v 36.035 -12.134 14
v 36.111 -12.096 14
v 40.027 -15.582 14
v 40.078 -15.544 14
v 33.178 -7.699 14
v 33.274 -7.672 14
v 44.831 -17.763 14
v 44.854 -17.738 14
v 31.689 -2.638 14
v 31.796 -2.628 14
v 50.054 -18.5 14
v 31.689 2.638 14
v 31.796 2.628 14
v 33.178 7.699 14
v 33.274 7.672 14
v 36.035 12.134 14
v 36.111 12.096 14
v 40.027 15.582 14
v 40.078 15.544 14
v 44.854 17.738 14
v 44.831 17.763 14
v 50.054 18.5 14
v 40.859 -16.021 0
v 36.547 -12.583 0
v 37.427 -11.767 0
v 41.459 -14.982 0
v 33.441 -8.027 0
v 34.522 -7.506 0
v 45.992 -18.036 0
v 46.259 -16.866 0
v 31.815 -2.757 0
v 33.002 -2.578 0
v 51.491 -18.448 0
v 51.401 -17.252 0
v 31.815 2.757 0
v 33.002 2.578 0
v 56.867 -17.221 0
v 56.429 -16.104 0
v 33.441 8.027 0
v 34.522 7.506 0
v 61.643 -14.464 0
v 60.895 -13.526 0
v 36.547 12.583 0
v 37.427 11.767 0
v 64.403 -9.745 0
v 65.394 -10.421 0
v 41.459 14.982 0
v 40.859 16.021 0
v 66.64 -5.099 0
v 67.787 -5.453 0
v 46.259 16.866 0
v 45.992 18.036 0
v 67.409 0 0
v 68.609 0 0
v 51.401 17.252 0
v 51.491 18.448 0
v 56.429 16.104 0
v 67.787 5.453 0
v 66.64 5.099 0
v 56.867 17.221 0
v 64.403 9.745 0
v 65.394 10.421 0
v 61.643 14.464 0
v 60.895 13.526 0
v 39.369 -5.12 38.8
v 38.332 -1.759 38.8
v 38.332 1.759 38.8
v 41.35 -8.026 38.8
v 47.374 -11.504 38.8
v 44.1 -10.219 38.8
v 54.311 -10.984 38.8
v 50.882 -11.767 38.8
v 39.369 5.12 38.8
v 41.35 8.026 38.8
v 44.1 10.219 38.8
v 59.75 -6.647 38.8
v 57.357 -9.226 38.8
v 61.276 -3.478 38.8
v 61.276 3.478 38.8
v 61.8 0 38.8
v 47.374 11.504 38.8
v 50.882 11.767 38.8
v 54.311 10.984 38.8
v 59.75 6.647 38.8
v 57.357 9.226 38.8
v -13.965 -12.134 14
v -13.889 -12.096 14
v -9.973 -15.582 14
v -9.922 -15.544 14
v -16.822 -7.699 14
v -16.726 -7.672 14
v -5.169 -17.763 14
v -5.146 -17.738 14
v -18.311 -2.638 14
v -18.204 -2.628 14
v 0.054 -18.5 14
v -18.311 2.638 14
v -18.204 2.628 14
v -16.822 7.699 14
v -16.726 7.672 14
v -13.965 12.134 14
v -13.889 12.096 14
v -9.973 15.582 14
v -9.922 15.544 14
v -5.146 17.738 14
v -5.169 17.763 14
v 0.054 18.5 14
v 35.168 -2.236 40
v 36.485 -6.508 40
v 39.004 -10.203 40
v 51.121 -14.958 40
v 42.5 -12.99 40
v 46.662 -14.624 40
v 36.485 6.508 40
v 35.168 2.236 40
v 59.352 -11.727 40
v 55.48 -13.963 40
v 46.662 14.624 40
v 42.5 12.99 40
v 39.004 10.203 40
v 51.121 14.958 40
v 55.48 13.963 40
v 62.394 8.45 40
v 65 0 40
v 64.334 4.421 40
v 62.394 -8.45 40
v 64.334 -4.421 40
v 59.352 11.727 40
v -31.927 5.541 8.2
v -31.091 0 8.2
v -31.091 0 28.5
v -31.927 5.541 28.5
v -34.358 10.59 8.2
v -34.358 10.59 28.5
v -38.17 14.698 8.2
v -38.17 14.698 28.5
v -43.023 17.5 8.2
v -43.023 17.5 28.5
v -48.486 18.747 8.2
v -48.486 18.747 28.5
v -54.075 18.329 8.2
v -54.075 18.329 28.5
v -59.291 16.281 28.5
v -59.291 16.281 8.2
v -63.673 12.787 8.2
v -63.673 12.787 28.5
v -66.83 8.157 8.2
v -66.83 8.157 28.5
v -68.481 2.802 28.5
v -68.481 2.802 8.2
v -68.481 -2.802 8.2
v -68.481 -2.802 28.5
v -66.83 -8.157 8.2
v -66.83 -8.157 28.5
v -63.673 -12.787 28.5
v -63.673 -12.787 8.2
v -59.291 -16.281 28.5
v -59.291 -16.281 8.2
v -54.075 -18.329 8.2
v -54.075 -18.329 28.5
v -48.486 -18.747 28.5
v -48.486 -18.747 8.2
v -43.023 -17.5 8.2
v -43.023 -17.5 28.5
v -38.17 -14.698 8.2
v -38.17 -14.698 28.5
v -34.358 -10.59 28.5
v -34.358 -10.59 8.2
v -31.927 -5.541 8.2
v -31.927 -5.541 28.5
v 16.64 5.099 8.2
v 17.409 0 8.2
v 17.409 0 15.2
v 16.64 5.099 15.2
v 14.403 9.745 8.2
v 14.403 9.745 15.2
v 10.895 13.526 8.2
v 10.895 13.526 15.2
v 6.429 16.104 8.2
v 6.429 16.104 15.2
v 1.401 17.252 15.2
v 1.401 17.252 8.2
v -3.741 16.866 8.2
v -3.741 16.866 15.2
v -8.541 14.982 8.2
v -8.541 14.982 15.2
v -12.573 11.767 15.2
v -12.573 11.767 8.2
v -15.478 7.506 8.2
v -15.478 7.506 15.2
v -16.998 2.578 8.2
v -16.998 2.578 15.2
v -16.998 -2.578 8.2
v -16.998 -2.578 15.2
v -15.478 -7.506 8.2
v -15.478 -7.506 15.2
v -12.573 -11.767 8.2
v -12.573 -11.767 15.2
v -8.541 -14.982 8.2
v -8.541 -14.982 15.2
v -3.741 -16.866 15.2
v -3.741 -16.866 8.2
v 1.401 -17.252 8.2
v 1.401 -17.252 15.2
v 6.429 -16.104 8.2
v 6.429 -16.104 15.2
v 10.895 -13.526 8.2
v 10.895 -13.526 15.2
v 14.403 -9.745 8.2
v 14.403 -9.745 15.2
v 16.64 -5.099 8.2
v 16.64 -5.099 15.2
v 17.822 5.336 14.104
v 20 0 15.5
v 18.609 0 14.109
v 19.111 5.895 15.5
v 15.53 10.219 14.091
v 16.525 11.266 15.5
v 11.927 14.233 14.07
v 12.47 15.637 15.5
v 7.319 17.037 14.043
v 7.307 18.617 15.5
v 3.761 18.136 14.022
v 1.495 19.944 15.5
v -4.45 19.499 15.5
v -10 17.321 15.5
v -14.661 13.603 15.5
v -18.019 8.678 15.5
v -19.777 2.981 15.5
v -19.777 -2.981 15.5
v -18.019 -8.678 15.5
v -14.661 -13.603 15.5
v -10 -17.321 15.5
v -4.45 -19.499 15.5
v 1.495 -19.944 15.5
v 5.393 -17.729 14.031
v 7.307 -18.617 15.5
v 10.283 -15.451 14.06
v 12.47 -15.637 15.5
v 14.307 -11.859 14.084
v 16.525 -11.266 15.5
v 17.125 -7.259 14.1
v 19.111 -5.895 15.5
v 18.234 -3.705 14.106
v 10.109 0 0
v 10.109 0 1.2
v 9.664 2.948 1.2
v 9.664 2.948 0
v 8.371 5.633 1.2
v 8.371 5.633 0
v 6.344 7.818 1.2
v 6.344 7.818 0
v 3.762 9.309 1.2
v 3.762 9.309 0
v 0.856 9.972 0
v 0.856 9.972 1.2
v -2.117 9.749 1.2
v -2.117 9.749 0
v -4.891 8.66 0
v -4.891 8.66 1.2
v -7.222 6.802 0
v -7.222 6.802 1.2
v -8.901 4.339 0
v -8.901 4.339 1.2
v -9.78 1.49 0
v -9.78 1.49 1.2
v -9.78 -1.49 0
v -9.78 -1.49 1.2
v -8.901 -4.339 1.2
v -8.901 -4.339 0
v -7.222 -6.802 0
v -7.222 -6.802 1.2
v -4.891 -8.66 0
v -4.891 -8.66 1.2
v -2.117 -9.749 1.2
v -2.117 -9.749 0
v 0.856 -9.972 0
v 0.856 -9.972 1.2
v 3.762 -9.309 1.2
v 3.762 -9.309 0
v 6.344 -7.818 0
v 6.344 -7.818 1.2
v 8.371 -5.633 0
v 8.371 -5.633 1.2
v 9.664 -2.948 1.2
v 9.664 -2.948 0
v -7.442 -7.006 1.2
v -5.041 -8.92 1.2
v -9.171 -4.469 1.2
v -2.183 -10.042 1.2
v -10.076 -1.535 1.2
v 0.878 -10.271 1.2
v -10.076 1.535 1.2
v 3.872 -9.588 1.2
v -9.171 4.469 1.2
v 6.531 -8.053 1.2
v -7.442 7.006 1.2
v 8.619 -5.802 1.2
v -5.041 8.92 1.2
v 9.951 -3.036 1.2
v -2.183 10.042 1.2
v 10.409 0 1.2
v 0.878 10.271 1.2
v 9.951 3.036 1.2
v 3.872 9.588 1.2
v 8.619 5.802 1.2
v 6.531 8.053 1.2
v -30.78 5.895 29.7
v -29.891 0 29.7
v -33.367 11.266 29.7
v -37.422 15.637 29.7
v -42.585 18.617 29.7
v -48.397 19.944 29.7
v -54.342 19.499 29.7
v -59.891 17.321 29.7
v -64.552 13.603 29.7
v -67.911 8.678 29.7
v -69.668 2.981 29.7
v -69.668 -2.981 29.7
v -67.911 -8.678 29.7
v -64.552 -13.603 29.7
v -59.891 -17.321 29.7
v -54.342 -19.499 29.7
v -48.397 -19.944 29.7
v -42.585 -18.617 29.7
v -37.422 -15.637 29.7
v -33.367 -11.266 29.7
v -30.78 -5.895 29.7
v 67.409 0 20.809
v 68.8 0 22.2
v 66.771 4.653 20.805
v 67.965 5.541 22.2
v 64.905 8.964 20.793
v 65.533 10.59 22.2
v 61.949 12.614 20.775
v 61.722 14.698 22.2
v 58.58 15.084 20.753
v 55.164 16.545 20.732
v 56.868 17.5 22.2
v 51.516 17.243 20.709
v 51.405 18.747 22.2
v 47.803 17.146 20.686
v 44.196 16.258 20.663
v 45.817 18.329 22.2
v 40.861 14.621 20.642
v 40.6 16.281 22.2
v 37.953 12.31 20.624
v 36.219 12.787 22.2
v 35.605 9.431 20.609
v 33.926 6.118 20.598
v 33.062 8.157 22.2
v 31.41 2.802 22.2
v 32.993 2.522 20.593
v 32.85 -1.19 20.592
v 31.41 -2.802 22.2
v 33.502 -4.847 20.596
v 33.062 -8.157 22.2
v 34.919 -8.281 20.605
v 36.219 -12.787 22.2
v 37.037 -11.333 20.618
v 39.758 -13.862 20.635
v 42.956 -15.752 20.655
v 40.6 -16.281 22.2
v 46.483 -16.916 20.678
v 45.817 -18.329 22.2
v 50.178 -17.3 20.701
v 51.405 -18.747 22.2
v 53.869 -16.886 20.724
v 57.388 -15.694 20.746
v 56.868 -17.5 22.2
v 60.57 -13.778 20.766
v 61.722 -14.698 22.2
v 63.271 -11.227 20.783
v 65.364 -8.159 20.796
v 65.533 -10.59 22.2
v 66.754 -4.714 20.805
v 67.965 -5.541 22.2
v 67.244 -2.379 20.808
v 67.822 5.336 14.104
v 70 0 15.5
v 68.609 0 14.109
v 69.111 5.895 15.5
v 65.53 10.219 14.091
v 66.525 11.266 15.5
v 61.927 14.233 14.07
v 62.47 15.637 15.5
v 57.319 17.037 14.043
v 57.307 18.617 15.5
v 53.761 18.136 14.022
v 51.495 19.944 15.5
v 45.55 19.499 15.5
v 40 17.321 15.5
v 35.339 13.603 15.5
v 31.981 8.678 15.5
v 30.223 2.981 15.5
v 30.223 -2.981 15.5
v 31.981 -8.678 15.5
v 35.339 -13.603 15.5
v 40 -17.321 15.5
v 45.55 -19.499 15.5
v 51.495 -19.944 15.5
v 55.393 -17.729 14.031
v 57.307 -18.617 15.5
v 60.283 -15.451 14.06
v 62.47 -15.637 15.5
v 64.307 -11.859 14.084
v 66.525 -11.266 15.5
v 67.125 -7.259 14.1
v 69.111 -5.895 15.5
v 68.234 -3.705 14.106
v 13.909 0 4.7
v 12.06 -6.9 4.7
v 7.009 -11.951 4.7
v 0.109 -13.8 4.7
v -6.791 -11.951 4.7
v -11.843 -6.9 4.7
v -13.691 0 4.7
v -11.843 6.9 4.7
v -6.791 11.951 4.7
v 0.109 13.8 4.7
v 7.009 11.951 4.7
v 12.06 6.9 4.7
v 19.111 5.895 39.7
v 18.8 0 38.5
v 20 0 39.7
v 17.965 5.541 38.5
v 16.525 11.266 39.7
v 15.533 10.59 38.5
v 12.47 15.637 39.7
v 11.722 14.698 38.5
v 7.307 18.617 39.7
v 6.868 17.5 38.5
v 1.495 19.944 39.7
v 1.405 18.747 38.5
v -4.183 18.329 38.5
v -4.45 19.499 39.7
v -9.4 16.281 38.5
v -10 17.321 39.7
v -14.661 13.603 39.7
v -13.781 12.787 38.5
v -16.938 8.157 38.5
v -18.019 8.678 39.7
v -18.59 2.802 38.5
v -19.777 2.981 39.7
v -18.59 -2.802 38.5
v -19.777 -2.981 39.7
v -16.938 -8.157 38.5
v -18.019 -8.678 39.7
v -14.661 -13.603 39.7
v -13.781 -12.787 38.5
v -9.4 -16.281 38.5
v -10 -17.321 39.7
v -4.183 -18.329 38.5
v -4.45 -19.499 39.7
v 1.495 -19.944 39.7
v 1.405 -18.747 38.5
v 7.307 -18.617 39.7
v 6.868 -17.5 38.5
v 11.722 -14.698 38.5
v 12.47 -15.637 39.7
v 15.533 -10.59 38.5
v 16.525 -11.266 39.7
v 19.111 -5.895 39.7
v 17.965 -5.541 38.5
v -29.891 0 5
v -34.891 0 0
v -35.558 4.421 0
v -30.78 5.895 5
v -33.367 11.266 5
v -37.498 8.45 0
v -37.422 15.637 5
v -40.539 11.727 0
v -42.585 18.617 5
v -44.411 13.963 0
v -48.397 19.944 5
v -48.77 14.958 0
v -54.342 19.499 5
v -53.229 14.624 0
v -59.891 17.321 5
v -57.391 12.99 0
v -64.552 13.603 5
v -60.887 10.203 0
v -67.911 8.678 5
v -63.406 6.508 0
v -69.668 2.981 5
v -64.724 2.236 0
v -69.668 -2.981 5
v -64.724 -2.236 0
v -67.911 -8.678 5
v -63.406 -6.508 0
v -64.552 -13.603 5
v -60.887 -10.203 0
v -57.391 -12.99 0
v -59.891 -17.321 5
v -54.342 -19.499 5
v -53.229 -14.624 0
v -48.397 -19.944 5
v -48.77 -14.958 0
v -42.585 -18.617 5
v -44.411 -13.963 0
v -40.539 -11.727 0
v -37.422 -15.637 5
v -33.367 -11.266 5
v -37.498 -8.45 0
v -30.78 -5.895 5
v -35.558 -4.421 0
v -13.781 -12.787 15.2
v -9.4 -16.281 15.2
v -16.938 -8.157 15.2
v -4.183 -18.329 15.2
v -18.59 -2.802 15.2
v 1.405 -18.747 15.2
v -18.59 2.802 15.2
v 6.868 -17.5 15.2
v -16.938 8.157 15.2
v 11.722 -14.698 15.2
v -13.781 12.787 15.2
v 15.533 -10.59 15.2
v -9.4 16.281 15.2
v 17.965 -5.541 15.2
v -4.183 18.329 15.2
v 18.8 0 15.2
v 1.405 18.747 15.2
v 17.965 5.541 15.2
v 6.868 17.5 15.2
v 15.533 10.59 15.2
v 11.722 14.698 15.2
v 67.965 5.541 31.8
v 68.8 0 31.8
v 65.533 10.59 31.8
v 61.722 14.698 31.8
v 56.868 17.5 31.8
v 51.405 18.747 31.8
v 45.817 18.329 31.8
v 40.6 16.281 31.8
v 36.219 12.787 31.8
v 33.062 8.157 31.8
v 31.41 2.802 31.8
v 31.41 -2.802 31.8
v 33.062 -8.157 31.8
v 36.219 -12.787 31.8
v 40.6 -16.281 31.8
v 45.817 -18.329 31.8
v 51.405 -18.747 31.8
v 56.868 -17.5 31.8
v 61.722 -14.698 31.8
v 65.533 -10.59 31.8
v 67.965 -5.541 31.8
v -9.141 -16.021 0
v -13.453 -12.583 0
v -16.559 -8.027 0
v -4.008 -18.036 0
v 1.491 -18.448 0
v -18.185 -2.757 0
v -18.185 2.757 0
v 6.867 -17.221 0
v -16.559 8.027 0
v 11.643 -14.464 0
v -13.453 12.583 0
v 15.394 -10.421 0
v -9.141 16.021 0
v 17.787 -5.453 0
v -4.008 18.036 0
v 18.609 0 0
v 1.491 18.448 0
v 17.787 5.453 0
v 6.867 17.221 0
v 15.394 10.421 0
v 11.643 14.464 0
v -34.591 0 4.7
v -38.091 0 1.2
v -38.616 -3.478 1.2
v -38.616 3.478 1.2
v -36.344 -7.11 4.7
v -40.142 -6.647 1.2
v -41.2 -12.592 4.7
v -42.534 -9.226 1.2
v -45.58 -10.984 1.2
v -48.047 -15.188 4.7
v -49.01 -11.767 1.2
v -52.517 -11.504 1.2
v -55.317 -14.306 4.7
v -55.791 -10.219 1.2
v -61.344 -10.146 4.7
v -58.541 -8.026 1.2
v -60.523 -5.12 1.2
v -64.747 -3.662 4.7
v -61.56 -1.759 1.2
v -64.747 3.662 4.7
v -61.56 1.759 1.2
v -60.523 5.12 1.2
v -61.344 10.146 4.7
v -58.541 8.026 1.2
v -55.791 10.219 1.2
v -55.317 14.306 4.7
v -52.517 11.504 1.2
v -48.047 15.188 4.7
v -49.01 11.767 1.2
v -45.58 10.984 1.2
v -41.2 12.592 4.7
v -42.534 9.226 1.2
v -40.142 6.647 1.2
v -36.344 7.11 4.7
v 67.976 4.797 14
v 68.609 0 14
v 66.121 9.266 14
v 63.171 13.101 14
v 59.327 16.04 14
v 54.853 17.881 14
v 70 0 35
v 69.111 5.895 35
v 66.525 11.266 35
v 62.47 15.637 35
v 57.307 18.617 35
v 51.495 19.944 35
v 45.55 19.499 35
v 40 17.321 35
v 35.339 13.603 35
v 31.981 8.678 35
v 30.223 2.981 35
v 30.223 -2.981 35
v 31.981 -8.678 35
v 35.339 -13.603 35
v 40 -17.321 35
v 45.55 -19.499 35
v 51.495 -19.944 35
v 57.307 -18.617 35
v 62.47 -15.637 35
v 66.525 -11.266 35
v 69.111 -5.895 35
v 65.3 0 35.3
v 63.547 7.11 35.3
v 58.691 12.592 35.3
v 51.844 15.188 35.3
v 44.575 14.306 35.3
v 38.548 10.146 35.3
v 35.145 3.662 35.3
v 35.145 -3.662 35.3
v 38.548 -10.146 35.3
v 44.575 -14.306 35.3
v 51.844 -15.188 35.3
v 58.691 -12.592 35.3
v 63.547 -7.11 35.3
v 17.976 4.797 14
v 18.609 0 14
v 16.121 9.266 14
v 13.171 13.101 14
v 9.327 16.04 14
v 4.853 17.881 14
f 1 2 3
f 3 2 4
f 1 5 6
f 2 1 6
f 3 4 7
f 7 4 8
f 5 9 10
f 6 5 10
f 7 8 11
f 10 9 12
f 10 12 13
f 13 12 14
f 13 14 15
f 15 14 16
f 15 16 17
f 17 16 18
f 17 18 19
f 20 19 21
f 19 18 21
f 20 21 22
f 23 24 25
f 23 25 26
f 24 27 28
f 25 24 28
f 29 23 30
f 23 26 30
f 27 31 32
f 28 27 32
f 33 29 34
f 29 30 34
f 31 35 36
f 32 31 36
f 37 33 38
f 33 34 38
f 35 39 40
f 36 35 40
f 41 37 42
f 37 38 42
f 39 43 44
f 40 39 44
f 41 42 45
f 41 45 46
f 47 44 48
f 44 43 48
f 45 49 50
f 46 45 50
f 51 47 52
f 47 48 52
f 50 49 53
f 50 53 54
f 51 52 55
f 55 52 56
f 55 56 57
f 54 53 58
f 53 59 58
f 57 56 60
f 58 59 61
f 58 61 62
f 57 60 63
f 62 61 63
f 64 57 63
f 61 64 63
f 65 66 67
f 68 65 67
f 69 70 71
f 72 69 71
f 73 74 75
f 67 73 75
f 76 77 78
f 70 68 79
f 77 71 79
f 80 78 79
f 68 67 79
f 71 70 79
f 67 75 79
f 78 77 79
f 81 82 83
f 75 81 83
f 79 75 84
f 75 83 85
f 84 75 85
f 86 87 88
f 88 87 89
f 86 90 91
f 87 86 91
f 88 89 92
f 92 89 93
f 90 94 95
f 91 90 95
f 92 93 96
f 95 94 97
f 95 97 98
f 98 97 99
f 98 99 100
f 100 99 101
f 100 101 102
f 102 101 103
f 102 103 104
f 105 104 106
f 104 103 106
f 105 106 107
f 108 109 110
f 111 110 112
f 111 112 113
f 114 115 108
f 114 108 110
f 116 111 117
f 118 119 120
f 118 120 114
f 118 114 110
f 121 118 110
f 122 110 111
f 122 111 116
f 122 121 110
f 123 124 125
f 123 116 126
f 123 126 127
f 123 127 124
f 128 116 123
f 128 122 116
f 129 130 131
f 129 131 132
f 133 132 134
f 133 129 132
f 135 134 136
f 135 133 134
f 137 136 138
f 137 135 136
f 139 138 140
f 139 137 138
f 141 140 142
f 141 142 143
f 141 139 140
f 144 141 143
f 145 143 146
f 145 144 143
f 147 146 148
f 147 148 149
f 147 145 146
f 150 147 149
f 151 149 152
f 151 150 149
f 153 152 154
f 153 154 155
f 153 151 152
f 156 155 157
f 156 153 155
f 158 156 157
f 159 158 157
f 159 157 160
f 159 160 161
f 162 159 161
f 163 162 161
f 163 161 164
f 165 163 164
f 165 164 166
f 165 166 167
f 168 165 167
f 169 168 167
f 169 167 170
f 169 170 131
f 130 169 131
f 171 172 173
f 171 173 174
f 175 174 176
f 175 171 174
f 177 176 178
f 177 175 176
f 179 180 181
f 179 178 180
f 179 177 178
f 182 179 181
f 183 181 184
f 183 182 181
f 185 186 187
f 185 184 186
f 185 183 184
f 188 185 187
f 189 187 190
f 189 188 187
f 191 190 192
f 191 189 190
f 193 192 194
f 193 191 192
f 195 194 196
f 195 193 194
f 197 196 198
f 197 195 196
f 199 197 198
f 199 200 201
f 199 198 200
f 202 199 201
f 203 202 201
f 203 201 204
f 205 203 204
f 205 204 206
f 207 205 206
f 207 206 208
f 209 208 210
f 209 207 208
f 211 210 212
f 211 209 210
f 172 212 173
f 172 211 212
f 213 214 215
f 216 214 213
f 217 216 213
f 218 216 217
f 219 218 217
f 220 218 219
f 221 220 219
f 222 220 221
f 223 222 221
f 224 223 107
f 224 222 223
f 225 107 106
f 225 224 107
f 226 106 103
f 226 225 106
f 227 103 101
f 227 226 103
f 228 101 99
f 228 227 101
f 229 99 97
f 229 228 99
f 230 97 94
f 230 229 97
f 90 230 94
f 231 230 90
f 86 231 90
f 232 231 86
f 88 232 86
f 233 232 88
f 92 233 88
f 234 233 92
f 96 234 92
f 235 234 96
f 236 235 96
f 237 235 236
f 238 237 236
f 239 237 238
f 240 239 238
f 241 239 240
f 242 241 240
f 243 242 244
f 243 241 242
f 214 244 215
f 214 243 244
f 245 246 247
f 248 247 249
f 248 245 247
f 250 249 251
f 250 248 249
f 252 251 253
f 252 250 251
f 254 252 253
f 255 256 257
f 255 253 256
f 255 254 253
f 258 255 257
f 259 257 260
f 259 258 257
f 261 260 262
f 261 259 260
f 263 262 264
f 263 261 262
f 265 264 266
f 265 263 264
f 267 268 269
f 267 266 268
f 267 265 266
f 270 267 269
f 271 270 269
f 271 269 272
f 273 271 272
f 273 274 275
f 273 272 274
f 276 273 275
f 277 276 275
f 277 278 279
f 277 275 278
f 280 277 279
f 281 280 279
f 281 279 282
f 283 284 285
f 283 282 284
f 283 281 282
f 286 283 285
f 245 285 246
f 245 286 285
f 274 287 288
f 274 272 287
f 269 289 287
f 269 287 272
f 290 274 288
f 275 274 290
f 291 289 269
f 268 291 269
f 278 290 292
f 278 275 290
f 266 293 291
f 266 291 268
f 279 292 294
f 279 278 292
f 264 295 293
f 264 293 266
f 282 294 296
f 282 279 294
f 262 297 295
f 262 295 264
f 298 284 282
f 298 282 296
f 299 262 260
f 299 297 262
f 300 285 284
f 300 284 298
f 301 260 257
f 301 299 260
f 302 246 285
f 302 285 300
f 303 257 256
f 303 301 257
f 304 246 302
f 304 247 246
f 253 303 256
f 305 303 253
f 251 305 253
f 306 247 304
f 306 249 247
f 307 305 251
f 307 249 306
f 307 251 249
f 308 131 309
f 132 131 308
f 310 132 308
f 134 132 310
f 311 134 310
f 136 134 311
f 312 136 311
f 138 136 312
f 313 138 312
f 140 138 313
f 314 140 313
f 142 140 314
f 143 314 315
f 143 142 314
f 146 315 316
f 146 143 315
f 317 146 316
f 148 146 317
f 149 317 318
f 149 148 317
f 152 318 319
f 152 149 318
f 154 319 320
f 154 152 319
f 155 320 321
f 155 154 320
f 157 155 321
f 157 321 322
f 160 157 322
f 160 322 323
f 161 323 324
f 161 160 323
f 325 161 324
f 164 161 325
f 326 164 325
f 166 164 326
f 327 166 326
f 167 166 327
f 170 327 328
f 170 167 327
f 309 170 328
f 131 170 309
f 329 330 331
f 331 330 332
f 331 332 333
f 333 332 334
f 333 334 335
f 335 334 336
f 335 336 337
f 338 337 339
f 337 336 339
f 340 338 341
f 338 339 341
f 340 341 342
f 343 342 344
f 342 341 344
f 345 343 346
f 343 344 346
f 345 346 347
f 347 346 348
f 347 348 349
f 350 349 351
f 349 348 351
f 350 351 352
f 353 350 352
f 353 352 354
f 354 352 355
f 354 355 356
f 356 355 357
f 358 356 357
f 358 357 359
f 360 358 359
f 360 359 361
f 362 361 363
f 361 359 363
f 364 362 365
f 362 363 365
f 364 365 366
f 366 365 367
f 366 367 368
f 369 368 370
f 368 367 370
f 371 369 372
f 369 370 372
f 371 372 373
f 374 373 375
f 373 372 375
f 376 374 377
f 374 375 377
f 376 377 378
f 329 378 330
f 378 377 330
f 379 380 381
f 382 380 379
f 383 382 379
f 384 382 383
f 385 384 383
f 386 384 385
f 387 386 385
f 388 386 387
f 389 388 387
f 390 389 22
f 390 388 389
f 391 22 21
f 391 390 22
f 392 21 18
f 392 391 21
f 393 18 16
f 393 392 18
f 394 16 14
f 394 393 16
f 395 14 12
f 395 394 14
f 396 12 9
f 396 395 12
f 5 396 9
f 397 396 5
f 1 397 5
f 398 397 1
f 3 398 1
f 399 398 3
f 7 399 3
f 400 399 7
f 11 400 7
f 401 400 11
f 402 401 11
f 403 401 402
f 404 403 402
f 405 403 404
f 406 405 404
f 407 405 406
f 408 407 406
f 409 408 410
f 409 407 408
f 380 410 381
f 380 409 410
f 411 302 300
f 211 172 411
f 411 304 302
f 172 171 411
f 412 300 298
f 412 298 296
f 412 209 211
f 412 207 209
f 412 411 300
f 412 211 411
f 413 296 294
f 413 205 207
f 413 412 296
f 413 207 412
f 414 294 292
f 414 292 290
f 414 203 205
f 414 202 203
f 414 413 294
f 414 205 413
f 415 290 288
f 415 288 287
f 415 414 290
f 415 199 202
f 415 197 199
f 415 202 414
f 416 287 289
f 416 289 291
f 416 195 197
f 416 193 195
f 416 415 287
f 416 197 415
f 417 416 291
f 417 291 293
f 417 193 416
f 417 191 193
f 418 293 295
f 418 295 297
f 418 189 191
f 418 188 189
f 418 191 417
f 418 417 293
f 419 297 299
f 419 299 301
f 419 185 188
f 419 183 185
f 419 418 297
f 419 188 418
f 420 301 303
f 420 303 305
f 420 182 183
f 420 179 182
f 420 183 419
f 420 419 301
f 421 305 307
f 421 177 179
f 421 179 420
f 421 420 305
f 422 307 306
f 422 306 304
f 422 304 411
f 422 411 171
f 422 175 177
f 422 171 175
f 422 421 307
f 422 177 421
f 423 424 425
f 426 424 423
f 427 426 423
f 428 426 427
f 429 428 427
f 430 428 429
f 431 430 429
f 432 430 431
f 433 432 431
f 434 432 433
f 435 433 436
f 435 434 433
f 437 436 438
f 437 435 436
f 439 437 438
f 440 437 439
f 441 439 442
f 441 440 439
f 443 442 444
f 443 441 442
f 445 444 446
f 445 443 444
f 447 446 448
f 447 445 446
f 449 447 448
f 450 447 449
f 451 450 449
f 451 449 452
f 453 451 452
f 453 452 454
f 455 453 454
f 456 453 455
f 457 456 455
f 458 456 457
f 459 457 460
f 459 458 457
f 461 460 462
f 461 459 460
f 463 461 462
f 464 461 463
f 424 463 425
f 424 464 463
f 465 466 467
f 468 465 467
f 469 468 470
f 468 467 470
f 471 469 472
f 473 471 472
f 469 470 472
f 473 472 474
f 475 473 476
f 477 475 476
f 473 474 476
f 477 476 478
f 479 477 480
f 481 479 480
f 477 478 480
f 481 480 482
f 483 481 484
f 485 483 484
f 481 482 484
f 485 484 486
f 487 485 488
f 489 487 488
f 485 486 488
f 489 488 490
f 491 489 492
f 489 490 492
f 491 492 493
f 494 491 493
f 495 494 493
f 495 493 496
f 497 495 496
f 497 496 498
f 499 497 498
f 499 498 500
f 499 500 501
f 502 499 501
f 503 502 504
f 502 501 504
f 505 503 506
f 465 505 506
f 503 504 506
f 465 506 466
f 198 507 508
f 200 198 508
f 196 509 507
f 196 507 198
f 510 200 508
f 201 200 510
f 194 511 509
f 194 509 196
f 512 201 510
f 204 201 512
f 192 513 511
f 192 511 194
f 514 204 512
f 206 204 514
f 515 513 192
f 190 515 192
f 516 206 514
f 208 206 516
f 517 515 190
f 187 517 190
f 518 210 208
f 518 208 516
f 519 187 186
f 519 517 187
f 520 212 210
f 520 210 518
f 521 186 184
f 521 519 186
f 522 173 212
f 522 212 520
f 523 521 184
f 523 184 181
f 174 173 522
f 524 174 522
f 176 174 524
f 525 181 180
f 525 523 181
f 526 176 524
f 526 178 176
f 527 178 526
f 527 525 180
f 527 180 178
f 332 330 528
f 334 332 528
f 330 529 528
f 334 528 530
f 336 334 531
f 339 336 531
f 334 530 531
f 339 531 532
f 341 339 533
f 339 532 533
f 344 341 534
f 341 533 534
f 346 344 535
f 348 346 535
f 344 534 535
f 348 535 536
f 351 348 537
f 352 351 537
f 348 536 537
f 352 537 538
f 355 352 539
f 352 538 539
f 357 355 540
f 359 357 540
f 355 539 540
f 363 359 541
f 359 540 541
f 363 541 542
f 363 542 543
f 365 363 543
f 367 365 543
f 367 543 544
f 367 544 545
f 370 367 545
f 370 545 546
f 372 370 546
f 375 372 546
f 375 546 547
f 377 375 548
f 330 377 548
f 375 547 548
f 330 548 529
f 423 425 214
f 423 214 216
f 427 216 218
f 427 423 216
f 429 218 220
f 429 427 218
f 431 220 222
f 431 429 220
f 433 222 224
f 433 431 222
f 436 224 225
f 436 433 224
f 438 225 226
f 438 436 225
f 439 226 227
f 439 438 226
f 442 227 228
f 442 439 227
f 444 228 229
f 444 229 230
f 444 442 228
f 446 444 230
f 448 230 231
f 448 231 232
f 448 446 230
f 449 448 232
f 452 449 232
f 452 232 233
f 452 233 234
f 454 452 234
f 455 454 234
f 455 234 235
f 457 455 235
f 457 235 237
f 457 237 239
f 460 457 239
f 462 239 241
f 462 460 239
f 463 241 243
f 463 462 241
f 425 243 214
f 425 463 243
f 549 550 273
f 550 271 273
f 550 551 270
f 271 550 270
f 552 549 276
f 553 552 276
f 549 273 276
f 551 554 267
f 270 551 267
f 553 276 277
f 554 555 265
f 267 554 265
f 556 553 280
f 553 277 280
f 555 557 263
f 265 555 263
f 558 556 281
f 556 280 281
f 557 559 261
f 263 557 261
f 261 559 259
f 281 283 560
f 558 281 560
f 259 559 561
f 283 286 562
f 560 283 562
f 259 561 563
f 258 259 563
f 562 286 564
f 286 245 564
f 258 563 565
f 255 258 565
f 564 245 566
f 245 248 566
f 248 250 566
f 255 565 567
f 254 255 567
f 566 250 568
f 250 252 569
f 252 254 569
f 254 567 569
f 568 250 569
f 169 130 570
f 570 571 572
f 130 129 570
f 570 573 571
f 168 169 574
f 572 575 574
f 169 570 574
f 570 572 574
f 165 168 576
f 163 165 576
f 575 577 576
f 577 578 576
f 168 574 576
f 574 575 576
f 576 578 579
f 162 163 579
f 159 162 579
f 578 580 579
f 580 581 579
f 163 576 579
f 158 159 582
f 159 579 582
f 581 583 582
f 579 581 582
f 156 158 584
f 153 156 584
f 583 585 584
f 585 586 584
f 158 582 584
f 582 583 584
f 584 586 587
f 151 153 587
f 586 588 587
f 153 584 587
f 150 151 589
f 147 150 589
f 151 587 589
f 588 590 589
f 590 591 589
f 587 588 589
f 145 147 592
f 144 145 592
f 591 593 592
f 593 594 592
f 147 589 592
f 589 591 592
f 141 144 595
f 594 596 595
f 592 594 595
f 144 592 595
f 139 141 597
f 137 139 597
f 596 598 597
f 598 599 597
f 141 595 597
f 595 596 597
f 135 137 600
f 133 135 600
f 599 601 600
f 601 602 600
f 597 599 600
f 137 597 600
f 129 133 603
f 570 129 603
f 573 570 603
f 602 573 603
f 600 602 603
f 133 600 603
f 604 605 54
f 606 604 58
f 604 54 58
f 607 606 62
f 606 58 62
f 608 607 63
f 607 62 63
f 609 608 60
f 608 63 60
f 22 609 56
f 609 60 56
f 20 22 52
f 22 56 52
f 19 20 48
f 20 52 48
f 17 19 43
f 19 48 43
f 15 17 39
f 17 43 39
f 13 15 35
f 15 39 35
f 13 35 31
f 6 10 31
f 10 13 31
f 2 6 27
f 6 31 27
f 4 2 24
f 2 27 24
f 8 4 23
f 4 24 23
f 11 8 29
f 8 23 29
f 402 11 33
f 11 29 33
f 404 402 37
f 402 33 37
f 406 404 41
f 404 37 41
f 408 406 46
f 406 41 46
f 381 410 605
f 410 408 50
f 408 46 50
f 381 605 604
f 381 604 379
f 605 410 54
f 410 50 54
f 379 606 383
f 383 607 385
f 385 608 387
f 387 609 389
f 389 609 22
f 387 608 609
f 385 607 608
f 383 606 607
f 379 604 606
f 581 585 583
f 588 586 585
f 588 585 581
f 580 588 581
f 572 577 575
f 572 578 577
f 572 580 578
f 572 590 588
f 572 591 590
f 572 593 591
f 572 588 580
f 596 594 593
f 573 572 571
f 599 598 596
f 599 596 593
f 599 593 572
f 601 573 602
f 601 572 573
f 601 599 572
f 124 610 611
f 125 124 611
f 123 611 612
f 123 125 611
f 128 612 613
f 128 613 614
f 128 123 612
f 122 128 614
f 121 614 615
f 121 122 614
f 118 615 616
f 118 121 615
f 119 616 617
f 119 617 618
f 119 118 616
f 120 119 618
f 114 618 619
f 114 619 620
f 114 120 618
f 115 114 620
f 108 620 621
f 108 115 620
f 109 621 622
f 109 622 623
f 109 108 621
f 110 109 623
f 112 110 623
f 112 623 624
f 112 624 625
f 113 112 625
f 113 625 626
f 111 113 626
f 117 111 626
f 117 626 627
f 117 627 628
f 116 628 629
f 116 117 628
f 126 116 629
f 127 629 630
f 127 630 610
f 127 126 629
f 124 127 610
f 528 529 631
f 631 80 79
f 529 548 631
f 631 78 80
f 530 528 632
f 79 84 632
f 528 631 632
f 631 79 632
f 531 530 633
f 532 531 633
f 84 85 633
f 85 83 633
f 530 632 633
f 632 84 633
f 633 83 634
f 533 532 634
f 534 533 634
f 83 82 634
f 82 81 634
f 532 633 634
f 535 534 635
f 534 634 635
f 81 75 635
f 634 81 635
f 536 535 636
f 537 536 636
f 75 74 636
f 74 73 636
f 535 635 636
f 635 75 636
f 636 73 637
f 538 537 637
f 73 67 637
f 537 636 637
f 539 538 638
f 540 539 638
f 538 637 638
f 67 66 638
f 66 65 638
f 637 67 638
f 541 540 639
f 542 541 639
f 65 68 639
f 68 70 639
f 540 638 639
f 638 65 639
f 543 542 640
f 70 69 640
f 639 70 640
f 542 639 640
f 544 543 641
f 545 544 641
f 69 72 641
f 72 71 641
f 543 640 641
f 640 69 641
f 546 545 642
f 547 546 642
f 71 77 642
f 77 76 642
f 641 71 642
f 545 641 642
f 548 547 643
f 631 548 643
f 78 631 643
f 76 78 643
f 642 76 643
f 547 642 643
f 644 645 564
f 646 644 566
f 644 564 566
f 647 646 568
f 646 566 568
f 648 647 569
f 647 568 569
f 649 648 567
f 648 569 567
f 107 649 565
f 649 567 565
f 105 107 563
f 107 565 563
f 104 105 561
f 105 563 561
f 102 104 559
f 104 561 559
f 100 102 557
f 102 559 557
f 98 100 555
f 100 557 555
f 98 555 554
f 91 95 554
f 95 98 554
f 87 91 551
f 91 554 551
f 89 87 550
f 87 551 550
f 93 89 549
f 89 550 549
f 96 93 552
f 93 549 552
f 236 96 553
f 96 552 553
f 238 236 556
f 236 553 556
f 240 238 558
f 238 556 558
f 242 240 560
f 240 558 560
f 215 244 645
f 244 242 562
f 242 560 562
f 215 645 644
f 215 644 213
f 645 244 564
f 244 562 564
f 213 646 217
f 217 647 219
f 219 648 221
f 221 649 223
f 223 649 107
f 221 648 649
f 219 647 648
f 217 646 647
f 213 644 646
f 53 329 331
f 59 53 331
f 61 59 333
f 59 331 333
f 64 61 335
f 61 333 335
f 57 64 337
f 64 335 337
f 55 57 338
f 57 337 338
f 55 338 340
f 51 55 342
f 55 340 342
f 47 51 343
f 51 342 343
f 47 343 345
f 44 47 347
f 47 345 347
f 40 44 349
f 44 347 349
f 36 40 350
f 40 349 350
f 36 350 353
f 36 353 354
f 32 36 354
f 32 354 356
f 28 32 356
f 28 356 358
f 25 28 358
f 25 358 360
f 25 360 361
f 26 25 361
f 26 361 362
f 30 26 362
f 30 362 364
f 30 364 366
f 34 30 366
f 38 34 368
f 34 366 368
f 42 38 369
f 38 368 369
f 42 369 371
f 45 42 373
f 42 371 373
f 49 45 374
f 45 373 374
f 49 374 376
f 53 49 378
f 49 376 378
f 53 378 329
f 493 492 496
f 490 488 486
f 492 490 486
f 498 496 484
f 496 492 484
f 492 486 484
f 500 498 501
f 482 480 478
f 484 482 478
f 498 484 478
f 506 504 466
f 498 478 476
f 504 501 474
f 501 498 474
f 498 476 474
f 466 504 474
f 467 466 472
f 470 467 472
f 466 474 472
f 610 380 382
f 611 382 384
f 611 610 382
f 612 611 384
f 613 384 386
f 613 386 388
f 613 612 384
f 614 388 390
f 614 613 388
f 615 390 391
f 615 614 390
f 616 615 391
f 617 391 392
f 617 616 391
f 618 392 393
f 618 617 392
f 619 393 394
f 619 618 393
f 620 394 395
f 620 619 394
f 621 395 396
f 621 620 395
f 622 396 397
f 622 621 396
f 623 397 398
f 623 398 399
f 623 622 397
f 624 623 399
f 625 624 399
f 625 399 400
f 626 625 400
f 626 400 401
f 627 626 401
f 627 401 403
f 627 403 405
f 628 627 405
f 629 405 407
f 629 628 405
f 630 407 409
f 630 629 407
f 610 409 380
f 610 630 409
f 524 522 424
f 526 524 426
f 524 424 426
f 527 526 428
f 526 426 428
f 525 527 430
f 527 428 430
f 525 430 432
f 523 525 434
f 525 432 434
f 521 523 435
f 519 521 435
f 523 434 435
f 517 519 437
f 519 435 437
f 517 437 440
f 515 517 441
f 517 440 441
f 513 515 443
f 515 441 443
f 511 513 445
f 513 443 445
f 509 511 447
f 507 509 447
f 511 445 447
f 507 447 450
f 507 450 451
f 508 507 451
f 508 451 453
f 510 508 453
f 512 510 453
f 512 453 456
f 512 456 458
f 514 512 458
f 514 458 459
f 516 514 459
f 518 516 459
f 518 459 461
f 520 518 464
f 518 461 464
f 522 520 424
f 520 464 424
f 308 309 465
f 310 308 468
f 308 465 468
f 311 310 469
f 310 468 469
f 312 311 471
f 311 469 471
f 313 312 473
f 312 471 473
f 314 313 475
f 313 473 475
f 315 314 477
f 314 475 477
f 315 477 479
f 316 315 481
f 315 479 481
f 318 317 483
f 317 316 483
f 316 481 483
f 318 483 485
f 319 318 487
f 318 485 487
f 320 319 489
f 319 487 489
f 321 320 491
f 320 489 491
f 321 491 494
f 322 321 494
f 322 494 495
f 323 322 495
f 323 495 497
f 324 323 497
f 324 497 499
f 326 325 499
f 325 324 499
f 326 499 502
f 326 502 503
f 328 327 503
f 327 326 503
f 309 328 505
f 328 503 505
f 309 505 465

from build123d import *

# Parameters (mm, degrees)
F0_R          = 20
F1_DEPTH      = 30
F0_R_2        = 18.5
F0_R_3        = 10
F2_DEPTH      = 15
F3_R          = 20
F4_DEPTH      = 25
F4_DEPTH_BACK = 1
F3_R_2        = 18.5
F5_T          = -1.2
F5_2_T        = -1.2
F5_3_T        = -1.2
F6_DEPTH      = 25.0000003725
F7_3_S7_R     = 17.3
F7_3_T8_DEPTH = 28
F8_2_S5_R     = 18.5
F8_2_T6_DEPTH = 30
F8_3_S5_R     = 18.5
F8_3_T6_DEPTH = 30
F9_SIZE       = 5
F9_2_SIZE     = 5


# Not quite as in the source:
# - a fillet or chamfer that OpenCascade refuses, or shapes differently, is made with other operations: its cross-section is extruded or revolved along the edge and cut away or added


with BuildPart() as f1:
    # F0 (on Top) → F1 (new body)
    with BuildSketch(Plane.XY):
        with Locations((-49.8913675547, 0)):
            Circle(F0_R)
    extrude(amount=F1_DEPTH)

    # F5
    f5_openings = [f1.faces().sort_by_distance(p)[0] for p in [
        (-49.891368, 0, 30),
    ]]
    offset(amount=F5_T, openings=f5_openings)

    # F7: chamfer of 7 on 1 edges, made by hand

    # F7_s1 → F7_t2 (revolve)
    with BuildSketch(Plane.XZ):
        Polygon((-31.0913675547, 8.2), (-38.0913675547, 1.2), (-31.0913675547, 1.2), align=None)
    revolve(axis=Axis((-49.8913675547, 0, 1.2), (0, 0, -1)))

    # F8: chamfer of 1.5 on 1 edges, made by hand

    # F8_s1 → F8_t2 (revolve, cut)
    with BuildSketch(Plane.XZ):
        Polygon((-29.5913675547, 30), (-31.0913675547, 28.5), (-31.0913675547, 30), align=None)
    revolve(axis=Axis((-49.8913675547, 0, 30), (0, 0, 1)), mode=Mode.SUBTRACT)

    # F9
    f9_edges = [f1.edges().sort_by_distance(p)[0] for p in [
        (-69.891368, 0, 0),
    ]]
    chamfer(f9_edges, length=F9_SIZE)


with BuildPart() as f2:
    # F0 (on Top) → F2 (new body)
    with BuildSketch(Plane.XY):
        with Locations((0.1086324453, 0)):
            Circle(F0_R_2)
        with Locations((0.1086324453, 0)):
            Circle(F0_R_3, mode=Mode.SUBTRACT)
        with Locations((0.1086324453, 0)):
            Circle(F0_R_3)
    extrude(amount=F2_DEPTH)

    # F3 (on face) → F4, piece 2 (join, two sides)
    with BuildSketch(Plane.XY.offset(15)) as f4_2_sk:
        Circle(F3_R)
        with Locations((0.1086324453, 0)):
            Circle(F3_R_2, mode=Mode.SUBTRACT)
        with Locations((0.1086324453, 0)):
            Circle(F3_R_2)
    extrude(amount=F4_DEPTH)
    extrude(f4_2_sk.sketch, amount=-F4_DEPTH_BACK)

    # F5#2
    f5_2_openings = [f2.faces().sort_by_distance(p)[0] for p in [
        (0, 0, 40),
    ]]
    offset(amount=F5_2_T, openings=f5_2_openings, kind=Kind.INTERSECTION)

    # F0 (on Top) → F6 (cut)
    with BuildSketch(Plane.XY):
        with Locations((0.1086324453, 0)):
            Circle(F0_R_3)
    extrude(amount=F6_DEPTH, mode=Mode.SUBTRACT)

    # F7#2: chamfer of 7 on 2 edges, made by hand

    # F7_2_s1 → F7_2_t2 (revolve)
    with BuildSketch(Plane.XZ):
        Polygon((10.4086324453, 1.2), (17.4086324453, 8.2), (17.4086324453, 1.2), align=None)
    revolve(axis=Axis((0.1086324453, 0, 1.2), (0, 0, -1)))

    # F8#2: chamfer of 1.5 on 2 edges, made by hand


with BuildPart() as f2b:
    # F0 (on Top) → F2, piece 2 (new body)
    with BuildSketch(Plane.XY):
        with Locations((50.1086324453, 0)):
            Circle(F0_R_2)
    extrude(amount=F2_DEPTH)

    # F3 (on face) → F4 (join, two sides)
    with BuildSketch(Plane.XY.offset(15)) as f4_sk:
        with Locations((50, 0)):
            Circle(F3_R)
    extrude(amount=F4_DEPTH)
    extrude(f4_sk.sketch, amount=-F4_DEPTH_BACK)

    # F5#3
    f5_3_openings = [f2b.faces().sort_by_distance(p)[0] for p in [
        (50.108632, 0, 0),
    ]]
    offset(amount=F5_3_T, openings=f5_3_openings, kind=Kind.INTERSECTION)

    # F7#3: chamfer of 7 on 3 edges, made by hand

    # F7_3_s1 → F7_3_t2 (revolve)
    with BuildSketch(Plane.XZ):
        Polygon((68.8, 31.8), (61.8, 38.8), (68.8, 38.8), align=None)
    revolve(axis=Axis((50, 0, 38.8), (0, 0, 1)))


with BuildPart() as f7_3_tool4:
    # F7_3_s5 → F7_3_t6 (revolve)
    with BuildSketch(Plane.XZ):
        Polygon((61.8, 15.2), (68.8, 22.2), (68.8, 15.2), align=None)
    revolve(axis=Axis((50, 0, 15.2), (0, 0, 1)))

    # F7_3_s7 → F7_3_t8 (cut, symmetric)
    with BuildSketch(Plane.XY.offset(18.7)):
        with Locations((50.1086324453, 0)):
            Circle(F7_3_S7_R)
    extrude(amount=F7_3_T8_DEPTH, both=True, mode=Mode.SUBTRACT)


with BuildPart() as f2b_1:
    add(f2b.part)

    # F7_3_t3: union F7_3_tool4
    add(f7_3_tool4.part)

    # F8#3: chamfer of 1.5 on 1 edges, made by hand


with BuildPart() as f8_2_tool2:
    # F8_2_s3 → F8_2_t4 (revolve)
    with BuildSketch(Plane.XZ):
        Polygon((18.5, 14), (20, 15.5), (20, 14), align=None)
    revolve(axis=Axis((0, 0, 14), (0, 0, 1)))

    # F8_2_s5 → F8_2_t6 (cut, symmetric)
    with BuildSketch(Plane.XY.offset(14.8)):
        with Locations((0.1086324453, 0)):
            Circle(F8_2_S5_R)
    extrude(amount=F8_2_T6_DEPTH, both=True, mode=Mode.SUBTRACT)


with BuildPart() as f2_1:
    add(f2.part)

    # F8_2_t1: cut F8_2_tool2
    add(f8_2_tool2.part, mode=Mode.SUBTRACT)

    # F8_2_s7 → F8_2_t8 (revolve, cut)
    with BuildSketch(Plane.XZ):
        Polygon((20.3, 40), (18.8, 38.5), (18.8, 40), align=None)
    revolve(axis=Axis((0, 0, 40), (0, 0, 1)), mode=Mode.SUBTRACT)


with BuildPart() as f8_3_tool2:
    # F8_3_s3 → F8_3_t4 (revolve)
    with BuildSketch(Plane.XZ):
        Polygon((68.5, 14), (70, 15.5), (70, 14), align=None)
    revolve(axis=Axis((50, 0, 14), (0, 0, 1)))

    # F8_3_s5 → F8_3_t6 (cut, symmetric)
    with BuildSketch(Plane.XY.offset(14.8)):
        with Locations((50.1086324453, 0)):
            Circle(F8_3_S5_R)
    extrude(amount=F8_3_T6_DEPTH, both=True, mode=Mode.SUBTRACT)


with BuildPart() as f2b_2:
    add(f2b_1.part)

    # F8_3_t1: cut F8_3_tool2
    add(f8_3_tool2.part, mode=Mode.SUBTRACT)

    # F9#2
    f9_2_edges = [f2b_2.edges().sort_by_distance(p)[0] for p in [
        (30, 0, 40),
    ]]
    chamfer(f9_2_edges, length=F9_2_SIZE)


solid = Compound([f1.part, f2_1.part, f2b_2.part])
